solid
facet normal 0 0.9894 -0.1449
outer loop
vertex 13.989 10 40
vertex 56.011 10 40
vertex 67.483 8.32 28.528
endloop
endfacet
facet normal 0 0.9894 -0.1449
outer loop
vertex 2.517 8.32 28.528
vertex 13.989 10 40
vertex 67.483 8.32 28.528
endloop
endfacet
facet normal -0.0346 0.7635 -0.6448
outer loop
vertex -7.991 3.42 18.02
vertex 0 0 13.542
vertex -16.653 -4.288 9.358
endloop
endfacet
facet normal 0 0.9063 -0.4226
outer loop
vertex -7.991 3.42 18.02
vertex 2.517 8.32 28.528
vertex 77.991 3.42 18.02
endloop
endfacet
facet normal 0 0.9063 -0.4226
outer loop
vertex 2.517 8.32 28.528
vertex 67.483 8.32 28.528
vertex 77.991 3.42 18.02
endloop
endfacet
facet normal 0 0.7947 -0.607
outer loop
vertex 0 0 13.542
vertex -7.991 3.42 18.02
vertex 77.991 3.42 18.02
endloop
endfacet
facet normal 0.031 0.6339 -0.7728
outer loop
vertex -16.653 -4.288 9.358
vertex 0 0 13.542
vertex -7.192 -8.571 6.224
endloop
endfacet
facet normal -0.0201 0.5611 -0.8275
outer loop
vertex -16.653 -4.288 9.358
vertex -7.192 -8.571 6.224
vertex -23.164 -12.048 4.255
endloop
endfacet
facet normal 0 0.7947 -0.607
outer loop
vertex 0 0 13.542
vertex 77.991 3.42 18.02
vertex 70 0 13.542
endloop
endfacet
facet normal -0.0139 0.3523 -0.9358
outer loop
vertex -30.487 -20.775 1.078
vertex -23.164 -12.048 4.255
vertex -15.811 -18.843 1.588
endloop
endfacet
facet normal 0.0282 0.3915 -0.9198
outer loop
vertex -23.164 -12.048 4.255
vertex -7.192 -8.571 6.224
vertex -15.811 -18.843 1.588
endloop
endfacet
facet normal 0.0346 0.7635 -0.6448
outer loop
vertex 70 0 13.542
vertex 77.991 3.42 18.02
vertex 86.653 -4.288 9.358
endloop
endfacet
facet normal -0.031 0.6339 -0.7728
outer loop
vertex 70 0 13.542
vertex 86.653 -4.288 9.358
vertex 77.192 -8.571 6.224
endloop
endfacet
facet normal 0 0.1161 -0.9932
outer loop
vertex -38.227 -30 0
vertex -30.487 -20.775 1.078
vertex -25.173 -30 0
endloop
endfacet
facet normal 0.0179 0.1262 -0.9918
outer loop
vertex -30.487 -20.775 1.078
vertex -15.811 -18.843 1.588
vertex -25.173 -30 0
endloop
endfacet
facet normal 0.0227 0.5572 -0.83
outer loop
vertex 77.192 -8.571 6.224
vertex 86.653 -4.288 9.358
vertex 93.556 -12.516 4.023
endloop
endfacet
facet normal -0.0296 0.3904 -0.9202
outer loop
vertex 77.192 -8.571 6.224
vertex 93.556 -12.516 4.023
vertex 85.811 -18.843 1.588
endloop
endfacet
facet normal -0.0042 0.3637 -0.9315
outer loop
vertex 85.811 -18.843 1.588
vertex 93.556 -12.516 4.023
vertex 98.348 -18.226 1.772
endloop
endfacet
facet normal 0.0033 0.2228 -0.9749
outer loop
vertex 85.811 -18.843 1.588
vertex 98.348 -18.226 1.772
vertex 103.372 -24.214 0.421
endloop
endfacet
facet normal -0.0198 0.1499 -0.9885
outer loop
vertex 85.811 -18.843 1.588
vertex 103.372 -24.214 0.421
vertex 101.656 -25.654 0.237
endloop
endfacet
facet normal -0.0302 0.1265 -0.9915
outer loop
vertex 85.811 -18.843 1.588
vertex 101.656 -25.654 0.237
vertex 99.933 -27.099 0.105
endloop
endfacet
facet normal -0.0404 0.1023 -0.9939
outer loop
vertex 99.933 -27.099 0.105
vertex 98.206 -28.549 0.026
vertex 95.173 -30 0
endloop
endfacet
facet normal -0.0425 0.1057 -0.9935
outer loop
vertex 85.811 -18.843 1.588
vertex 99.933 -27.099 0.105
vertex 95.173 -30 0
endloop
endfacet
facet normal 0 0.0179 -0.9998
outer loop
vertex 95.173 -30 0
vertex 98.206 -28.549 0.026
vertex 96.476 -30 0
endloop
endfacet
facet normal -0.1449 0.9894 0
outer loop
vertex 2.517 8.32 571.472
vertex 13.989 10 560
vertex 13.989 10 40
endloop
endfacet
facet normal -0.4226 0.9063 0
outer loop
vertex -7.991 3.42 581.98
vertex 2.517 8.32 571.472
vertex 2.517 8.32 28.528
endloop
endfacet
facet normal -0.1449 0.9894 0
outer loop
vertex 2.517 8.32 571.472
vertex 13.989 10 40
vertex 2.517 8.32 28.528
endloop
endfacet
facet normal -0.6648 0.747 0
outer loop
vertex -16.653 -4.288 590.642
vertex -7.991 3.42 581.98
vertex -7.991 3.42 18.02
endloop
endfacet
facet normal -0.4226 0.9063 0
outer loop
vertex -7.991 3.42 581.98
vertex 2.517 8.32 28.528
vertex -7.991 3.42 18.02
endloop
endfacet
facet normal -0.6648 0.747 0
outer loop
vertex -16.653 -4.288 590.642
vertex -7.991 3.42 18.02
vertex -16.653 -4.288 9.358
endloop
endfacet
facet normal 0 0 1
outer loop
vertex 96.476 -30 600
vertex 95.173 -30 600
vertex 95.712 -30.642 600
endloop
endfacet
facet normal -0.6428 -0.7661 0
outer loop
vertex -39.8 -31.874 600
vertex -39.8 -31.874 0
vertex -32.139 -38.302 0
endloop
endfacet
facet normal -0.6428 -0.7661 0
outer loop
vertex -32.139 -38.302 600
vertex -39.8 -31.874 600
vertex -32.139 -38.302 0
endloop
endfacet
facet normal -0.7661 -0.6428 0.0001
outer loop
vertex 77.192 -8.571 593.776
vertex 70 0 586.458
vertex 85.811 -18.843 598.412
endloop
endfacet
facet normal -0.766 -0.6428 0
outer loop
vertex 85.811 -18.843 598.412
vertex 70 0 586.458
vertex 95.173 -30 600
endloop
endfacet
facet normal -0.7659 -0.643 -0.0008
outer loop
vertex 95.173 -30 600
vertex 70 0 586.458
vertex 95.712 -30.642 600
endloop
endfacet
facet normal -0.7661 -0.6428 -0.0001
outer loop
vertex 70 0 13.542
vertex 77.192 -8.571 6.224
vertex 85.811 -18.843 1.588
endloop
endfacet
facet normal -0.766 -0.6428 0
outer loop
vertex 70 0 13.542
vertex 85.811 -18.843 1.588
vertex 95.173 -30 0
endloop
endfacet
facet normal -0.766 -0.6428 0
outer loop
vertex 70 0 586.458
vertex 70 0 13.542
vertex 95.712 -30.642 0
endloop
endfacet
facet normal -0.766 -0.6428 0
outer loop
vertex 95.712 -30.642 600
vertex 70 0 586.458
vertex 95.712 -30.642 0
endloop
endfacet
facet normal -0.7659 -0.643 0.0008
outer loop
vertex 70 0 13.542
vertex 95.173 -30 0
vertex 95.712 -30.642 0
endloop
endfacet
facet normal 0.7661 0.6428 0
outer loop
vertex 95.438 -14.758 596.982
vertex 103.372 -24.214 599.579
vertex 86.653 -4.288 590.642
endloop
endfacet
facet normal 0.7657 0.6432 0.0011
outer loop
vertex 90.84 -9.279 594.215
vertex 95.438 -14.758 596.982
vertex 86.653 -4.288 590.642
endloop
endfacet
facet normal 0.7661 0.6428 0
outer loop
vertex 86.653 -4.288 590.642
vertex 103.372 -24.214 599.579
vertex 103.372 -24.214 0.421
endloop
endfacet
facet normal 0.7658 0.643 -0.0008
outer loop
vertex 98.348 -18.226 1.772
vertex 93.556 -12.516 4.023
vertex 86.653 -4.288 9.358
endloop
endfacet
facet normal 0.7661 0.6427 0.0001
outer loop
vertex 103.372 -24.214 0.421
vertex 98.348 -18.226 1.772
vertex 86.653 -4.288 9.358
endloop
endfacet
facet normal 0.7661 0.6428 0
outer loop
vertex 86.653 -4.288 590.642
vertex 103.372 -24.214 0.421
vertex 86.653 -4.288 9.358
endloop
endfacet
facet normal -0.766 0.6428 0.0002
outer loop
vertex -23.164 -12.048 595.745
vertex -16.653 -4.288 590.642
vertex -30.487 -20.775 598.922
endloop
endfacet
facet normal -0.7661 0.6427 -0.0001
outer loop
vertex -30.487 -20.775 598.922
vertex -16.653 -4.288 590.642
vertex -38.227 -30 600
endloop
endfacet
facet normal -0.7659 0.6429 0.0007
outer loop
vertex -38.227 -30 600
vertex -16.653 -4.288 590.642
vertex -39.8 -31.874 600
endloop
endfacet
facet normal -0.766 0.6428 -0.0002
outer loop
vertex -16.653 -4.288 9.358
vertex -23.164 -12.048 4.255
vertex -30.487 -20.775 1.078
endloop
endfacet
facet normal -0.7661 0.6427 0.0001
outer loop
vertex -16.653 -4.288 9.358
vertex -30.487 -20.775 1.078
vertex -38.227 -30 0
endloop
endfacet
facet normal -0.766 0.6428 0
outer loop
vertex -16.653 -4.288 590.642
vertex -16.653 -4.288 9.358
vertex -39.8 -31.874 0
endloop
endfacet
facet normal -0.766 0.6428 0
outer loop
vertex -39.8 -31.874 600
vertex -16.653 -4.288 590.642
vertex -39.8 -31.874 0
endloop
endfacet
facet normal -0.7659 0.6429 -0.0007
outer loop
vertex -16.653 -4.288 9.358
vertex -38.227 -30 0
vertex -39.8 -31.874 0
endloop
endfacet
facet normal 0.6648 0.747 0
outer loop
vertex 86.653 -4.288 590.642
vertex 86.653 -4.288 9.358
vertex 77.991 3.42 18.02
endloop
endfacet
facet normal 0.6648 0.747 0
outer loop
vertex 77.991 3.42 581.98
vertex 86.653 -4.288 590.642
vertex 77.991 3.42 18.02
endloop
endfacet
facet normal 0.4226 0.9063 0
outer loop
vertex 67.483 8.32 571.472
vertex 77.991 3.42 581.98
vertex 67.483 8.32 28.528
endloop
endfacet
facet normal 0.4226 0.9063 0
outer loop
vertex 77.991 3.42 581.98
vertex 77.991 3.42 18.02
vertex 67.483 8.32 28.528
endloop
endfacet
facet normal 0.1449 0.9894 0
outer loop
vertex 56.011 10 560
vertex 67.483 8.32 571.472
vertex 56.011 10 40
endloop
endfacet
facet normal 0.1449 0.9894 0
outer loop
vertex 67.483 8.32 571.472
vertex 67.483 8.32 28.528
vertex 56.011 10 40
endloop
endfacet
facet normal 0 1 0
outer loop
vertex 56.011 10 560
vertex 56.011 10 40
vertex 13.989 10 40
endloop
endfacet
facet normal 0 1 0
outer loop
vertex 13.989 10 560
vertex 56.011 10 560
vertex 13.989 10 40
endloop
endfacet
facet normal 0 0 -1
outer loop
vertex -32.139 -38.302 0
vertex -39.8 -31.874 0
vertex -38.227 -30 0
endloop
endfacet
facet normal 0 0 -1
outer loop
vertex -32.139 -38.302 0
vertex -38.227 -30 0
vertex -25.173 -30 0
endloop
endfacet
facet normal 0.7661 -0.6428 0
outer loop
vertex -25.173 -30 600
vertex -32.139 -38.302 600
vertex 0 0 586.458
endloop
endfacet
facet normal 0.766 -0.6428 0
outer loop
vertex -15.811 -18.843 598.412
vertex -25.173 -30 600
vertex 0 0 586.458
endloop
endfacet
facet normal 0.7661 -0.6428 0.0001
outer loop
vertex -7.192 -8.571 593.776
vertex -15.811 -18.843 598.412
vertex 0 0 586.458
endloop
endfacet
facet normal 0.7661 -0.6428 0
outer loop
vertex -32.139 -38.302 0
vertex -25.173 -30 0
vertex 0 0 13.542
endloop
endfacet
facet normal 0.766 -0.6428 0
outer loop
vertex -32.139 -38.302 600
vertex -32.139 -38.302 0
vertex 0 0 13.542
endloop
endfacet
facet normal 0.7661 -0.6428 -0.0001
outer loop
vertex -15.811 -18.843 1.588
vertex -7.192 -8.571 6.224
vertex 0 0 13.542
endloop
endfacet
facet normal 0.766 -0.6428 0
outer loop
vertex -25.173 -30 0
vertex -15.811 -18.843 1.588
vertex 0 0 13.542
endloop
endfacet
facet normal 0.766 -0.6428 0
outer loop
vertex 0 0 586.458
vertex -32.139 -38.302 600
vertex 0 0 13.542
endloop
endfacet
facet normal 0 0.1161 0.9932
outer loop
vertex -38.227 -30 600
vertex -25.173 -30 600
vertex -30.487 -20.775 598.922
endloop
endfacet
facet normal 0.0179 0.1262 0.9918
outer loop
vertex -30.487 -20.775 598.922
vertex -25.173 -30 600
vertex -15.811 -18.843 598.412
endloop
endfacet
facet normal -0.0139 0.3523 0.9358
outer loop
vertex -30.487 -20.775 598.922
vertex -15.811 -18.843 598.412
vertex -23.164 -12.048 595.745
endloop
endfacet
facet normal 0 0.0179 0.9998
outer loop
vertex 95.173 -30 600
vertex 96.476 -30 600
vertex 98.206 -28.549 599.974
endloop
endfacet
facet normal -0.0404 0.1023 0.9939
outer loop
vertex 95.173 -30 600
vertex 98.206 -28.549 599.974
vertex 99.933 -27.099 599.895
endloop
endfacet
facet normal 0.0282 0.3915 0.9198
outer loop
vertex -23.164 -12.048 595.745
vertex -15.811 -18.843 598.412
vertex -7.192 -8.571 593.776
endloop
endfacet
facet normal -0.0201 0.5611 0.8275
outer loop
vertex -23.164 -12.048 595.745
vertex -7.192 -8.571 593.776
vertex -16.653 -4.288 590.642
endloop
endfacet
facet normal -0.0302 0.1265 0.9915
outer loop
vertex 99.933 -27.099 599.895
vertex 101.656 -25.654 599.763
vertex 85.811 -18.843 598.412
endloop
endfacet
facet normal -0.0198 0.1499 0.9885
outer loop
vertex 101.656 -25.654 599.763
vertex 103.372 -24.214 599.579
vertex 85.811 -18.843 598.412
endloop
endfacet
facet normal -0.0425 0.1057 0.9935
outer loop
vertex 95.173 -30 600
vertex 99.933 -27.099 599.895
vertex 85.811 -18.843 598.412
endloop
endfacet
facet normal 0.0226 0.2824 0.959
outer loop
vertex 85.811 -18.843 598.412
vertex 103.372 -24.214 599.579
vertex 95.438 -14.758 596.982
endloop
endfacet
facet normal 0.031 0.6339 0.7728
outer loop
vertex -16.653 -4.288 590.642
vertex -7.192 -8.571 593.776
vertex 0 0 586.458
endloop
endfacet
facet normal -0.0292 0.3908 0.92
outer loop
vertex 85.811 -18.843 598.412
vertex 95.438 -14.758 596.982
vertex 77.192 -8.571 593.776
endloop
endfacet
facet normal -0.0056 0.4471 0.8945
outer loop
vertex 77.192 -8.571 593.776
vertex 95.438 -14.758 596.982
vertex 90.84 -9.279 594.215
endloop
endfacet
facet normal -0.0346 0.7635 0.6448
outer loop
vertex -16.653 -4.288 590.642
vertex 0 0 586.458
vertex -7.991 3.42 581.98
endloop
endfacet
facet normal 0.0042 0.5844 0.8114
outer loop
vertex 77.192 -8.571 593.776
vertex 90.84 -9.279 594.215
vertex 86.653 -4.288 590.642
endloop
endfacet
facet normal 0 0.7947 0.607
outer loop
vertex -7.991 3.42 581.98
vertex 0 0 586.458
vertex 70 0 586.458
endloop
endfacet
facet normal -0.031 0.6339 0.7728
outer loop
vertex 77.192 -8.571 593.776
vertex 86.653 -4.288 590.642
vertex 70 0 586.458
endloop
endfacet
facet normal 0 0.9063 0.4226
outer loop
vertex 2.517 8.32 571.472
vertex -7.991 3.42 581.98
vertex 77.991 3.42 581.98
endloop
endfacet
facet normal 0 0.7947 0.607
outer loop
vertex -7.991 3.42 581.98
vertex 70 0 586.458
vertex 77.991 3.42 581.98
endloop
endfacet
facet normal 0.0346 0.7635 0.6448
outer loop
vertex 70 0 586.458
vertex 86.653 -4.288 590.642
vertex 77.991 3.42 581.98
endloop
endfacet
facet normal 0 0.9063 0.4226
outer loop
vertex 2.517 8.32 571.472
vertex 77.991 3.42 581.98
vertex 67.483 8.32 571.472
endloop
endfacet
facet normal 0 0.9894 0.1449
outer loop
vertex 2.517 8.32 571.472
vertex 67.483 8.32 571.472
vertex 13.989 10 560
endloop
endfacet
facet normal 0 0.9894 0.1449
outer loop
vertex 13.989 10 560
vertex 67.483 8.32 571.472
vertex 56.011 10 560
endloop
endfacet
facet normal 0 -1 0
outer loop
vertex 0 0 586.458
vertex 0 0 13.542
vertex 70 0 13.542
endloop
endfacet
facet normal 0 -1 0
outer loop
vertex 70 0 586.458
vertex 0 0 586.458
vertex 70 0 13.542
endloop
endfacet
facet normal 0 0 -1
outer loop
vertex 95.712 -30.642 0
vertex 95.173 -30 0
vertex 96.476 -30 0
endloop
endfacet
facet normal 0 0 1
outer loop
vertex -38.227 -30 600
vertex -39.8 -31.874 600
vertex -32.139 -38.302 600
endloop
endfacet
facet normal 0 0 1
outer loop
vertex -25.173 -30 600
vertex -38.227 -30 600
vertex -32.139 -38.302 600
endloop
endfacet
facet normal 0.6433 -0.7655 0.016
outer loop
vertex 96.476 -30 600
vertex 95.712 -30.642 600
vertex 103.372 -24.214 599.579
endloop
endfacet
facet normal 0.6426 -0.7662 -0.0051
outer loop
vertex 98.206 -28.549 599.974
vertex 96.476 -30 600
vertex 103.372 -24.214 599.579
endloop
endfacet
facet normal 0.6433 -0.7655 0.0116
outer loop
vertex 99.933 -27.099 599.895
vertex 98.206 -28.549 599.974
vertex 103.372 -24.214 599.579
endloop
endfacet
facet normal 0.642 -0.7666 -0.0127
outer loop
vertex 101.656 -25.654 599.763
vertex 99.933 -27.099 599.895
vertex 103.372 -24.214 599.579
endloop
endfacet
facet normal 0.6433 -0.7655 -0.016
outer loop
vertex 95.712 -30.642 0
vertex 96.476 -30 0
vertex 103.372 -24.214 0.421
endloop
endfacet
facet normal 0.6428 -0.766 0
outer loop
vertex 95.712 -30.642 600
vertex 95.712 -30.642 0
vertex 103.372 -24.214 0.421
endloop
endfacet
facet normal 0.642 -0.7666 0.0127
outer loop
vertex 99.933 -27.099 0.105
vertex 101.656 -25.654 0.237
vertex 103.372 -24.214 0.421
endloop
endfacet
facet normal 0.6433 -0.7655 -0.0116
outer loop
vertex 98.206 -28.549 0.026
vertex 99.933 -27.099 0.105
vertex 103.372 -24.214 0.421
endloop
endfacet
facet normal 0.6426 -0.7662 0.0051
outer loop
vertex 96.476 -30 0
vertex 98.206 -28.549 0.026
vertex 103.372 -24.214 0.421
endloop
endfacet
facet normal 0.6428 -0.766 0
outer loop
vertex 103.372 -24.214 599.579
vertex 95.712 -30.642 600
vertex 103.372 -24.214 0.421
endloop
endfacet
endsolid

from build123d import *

# Parameters (mm, degrees)
EXTRUDE_THIN1_DEPTH = 600
FILLET2_R           = 40


with BuildPart() as part:
    # Sketch1 → Extrude-Thin1 (new body)
    with BuildSketch(Plane.XY):
        Polygon((-32.139380484, -38.302222156), (0, 0), (70, 0), (95.711504387, -30.641777725), (103.371948819, -24.213901628), (74.663076582, 10), (-4.663076582, 10), (-39.799824916, -31.874346059), align=None)
    extrude(amount=EXTRUDE_THIN1_DEPTH)

    # Fillet2
    # the kernel refuses this fillet: 40 mm, written as the material it takes off along each edge
    with BuildSketch(Plane(origin=(74.663076582, 10, -46.630765815), x_dir=(0.6427876096865376, -0.7660444431189795, 0), z_dir=(0, 0, 1)), Plane(origin=(-4.663076582, 10, -46.630765815), x_dir=(1, 0, 0), z_dir=(0, 0, 1))) as fillet2_piece_1:
        with BuildLine():
            CenterArc((FILLET2_R * 0.466307658155, -FILLET2_R), FILLET2_R, 90, 50)
            Line((-FILLET2_R * 0.299736784964, -FILLET2_R * 0.357212390313), (0, 0))
            Line((0, 0), (FILLET2_R * 0.466307658155, 0))
        make_face()
    extrude(amount=693.261531631, mode=Mode.SUBTRACT)
    with BuildSketch(Plane(origin=(174.663076582, 10, 600), x_dir=(0, 0, -1), z_dir=(-1, 0, 0))) as fillet2_piece_2:
        with BuildLine():
            CenterArc((FILLET2_R, FILLET2_R), FILLET2_R, 180, 90)
            Line((0, FILLET2_R), (0, 0))
            Line((0, 0), (FILLET2_R, 0))
        make_face()
    extrude(amount=279.326153163, mode=Mode.SUBTRACT)
    with BuildSketch(Plane(origin=(174.663076582, 10, 0), x_dir=(0, 0, 1), z_dir=(-1, 0, 0))) as fillet2_piece_3:
        with BuildLine():
            CenterArc((FILLET2_R, -FILLET2_R), FILLET2_R, 90, 90)
            Line((0, -FILLET2_R), (0, 0))
            Line((0, 0), (FILLET2_R, 0))
        make_face()
    extrude(amount=279.326153163, mode=Mode.SUBTRACT)


solid = part.part
